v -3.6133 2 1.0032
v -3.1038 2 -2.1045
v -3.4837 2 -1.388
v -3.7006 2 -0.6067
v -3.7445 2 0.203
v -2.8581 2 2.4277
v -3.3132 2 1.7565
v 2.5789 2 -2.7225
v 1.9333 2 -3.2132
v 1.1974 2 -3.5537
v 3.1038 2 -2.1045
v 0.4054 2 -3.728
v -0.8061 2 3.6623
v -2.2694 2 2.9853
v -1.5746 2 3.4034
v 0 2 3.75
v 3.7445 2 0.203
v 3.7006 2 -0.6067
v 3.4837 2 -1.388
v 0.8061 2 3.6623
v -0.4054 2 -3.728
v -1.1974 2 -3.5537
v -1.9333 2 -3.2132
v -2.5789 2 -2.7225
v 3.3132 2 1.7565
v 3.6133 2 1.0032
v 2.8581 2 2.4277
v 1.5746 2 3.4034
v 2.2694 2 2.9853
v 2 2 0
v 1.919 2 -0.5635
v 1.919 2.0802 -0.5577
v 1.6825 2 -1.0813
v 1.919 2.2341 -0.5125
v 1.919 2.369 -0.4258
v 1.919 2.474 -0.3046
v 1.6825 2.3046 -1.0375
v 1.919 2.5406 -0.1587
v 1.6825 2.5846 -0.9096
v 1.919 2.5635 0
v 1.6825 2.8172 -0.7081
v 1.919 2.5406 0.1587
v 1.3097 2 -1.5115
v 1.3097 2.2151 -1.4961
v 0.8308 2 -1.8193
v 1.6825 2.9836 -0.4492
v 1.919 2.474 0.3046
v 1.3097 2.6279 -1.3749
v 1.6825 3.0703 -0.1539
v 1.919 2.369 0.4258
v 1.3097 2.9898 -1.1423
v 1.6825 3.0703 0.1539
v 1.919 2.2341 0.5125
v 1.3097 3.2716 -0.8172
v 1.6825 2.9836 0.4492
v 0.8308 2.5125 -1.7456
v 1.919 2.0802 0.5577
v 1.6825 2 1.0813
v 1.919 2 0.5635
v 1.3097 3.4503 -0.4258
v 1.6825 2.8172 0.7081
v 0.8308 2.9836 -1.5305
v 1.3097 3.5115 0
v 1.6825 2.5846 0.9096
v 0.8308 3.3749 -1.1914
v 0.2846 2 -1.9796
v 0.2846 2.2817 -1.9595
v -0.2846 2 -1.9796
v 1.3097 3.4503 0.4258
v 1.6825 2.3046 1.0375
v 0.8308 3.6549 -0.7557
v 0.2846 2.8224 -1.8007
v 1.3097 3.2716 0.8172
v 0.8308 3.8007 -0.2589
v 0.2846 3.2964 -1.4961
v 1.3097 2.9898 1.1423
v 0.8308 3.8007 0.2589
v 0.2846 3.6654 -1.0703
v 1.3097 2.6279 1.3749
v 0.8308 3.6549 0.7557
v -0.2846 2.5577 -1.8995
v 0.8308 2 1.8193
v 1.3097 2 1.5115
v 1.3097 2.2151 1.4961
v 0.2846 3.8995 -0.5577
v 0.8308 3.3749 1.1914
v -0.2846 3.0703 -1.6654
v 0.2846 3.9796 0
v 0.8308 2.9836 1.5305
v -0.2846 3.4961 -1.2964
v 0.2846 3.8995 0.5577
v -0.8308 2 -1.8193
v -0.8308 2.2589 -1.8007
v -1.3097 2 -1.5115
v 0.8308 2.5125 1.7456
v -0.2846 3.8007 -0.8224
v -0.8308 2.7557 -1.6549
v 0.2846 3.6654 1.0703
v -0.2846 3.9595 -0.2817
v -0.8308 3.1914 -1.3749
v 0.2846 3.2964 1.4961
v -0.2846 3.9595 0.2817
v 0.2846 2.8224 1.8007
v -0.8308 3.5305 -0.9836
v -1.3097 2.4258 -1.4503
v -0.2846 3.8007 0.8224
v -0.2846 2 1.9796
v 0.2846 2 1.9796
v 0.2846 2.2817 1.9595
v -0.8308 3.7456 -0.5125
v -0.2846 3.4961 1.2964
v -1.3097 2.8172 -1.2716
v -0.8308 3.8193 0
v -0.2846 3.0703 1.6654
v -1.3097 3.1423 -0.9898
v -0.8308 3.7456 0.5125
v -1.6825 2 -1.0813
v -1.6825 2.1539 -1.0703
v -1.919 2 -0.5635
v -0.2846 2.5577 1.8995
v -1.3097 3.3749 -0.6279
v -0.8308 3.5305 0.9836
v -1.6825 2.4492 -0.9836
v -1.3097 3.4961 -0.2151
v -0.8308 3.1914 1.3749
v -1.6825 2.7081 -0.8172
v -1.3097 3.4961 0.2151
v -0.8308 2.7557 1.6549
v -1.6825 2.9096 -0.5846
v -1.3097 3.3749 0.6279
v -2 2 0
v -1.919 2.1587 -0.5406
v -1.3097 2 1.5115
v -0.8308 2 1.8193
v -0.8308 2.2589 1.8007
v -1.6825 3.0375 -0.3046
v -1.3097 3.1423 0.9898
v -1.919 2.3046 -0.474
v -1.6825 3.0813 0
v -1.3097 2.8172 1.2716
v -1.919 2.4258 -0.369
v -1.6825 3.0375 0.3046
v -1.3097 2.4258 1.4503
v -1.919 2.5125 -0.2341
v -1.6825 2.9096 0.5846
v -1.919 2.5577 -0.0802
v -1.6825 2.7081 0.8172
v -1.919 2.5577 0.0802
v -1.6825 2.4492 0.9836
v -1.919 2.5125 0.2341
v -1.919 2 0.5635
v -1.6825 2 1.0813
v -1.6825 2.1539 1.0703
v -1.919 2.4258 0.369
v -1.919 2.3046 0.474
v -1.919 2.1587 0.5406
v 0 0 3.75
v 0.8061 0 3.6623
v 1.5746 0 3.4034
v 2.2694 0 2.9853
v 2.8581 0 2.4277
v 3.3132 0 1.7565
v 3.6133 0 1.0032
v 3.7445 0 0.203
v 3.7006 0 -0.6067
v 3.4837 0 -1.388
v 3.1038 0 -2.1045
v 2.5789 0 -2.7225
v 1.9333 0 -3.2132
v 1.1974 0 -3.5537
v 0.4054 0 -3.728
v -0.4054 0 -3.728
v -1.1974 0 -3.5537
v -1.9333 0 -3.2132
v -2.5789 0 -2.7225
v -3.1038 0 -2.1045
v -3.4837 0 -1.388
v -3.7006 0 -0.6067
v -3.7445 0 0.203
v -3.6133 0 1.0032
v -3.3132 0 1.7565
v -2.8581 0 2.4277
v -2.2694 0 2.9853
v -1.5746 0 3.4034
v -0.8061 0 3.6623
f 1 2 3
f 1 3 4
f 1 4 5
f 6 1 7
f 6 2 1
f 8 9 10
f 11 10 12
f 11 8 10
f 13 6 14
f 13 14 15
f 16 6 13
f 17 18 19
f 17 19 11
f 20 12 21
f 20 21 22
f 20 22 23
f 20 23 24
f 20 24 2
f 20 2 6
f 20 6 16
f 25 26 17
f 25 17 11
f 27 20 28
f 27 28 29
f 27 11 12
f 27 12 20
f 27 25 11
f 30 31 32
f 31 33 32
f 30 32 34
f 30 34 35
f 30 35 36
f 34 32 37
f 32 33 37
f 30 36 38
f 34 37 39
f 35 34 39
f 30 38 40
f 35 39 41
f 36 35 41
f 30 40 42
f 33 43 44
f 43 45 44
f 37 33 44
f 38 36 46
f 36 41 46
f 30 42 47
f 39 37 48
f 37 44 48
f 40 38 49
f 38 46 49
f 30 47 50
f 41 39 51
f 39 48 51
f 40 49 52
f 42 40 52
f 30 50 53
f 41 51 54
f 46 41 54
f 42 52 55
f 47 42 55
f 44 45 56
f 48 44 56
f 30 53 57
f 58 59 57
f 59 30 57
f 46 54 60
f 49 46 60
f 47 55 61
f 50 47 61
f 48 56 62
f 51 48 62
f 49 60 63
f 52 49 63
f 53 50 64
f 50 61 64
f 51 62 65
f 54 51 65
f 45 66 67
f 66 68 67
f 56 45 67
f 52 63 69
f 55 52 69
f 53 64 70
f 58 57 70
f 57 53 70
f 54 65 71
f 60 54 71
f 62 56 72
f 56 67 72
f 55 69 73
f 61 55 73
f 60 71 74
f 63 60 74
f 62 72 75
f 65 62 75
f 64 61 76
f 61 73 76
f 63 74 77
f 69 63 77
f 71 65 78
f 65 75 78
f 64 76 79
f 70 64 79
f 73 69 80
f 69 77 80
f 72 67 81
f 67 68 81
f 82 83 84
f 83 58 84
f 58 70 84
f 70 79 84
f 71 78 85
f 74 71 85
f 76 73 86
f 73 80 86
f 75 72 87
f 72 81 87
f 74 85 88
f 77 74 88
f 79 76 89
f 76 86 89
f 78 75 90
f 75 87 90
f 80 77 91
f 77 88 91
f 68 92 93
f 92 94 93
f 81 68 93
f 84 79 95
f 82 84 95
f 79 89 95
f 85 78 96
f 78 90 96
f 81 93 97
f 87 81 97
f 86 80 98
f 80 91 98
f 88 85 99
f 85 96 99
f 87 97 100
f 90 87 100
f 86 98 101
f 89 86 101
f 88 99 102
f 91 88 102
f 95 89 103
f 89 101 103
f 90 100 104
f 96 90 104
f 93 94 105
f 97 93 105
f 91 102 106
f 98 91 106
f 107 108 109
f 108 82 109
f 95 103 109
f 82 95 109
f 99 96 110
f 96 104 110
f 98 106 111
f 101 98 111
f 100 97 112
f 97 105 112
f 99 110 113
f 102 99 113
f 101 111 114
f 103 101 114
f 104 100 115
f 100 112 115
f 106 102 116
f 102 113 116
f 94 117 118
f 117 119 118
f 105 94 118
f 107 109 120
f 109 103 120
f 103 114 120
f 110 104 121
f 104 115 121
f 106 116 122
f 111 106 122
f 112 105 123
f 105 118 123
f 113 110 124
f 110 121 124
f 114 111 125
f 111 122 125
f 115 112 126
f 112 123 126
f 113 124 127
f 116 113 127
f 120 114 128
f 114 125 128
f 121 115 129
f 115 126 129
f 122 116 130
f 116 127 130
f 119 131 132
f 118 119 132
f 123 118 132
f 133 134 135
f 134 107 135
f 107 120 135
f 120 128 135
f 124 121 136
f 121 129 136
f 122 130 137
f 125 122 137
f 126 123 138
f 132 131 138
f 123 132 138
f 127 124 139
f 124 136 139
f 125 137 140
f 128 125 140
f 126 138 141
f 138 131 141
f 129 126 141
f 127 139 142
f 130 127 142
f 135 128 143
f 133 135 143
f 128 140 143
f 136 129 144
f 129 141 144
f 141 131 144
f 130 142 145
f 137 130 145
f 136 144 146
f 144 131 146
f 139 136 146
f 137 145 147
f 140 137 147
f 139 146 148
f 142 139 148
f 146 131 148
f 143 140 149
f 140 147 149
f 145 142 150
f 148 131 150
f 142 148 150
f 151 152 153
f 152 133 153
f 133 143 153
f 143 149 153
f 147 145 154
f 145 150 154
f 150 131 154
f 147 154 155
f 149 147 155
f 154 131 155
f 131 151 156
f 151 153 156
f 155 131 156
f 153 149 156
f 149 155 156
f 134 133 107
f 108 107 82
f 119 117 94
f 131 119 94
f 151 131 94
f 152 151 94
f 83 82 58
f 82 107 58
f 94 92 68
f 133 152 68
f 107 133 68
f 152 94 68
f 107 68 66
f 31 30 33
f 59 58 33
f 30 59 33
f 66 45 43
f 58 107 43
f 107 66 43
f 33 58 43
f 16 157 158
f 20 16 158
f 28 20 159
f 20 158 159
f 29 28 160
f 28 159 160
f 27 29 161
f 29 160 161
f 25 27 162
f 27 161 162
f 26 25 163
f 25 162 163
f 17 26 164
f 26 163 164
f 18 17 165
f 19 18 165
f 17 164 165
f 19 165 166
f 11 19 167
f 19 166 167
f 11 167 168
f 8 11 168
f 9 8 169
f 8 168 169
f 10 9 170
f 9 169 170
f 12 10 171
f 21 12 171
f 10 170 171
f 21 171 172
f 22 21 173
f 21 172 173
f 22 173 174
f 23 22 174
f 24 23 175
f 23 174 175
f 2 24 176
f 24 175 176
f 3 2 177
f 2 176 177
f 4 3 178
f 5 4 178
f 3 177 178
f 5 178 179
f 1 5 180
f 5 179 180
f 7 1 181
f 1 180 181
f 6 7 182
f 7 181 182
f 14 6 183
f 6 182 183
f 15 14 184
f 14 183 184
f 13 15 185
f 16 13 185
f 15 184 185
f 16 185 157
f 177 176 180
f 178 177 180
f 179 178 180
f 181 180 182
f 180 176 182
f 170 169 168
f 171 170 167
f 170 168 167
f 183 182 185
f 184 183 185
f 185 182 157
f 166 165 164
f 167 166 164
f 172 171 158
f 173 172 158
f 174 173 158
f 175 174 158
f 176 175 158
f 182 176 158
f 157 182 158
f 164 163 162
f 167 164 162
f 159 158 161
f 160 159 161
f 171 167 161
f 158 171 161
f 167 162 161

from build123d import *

# Parameters (mm, degrees)
SKETCH1_R               = 3.75
BOSS_EXTRUDE1_DEPTH     = 2
CUT_EXTRUDE1_DEPTH      = 7.642665128
CUT_EXTRUDE1_DEPTH_BACK = 7.642665128
SKETCH3_W               = 4
SKETCH3_H               = 2


with BuildPart() as part:
    # Sketch1 → Boss-Extrude1 (new body)
    with BuildSketch(Plane(origin=(0, 0, 0), x_dir=(1, 0, 0), z_dir=(0, 1, 0))):
        with Locations(Location((0, 0, 0), (0, 0, 270))):
            Circle(SKETCH1_R)
    extrude(amount=BOSS_EXTRUDE1_DEPTH)


with BuildPart() as body_2:
    # Sketch2 → Revolve6 (revolve)
    with BuildSketch(Plane(origin=(0, 2, 0), x_dir=(1, 0, 0), z_dir=(0, 1, 0))):
        with BuildLine():
            Line((-2, 0), (2, 0))
            ThreePointArc((2, 0), (0, 2), (-2, 0))
        make_face()
    revolve(axis=Axis((2.864015087, 2, 0), (1, 0, 0)))

    # Sketch3 → Cut-Extrude1 (cut, two sides: drawn at the far end of the back side and taken through both)
    with BuildSketch(Plane.XY.offset(-CUT_EXTRUDE1_DEPTH_BACK)):
        with Locations((0, 1)):
            Rectangle(SKETCH3_W, SKETCH3_H)
    extrude(amount=CUT_EXTRUDE1_DEPTH + CUT_EXTRUDE1_DEPTH_BACK, mode=Mode.SUBTRACT)


solid = Compound([part.part, body_2.part])
